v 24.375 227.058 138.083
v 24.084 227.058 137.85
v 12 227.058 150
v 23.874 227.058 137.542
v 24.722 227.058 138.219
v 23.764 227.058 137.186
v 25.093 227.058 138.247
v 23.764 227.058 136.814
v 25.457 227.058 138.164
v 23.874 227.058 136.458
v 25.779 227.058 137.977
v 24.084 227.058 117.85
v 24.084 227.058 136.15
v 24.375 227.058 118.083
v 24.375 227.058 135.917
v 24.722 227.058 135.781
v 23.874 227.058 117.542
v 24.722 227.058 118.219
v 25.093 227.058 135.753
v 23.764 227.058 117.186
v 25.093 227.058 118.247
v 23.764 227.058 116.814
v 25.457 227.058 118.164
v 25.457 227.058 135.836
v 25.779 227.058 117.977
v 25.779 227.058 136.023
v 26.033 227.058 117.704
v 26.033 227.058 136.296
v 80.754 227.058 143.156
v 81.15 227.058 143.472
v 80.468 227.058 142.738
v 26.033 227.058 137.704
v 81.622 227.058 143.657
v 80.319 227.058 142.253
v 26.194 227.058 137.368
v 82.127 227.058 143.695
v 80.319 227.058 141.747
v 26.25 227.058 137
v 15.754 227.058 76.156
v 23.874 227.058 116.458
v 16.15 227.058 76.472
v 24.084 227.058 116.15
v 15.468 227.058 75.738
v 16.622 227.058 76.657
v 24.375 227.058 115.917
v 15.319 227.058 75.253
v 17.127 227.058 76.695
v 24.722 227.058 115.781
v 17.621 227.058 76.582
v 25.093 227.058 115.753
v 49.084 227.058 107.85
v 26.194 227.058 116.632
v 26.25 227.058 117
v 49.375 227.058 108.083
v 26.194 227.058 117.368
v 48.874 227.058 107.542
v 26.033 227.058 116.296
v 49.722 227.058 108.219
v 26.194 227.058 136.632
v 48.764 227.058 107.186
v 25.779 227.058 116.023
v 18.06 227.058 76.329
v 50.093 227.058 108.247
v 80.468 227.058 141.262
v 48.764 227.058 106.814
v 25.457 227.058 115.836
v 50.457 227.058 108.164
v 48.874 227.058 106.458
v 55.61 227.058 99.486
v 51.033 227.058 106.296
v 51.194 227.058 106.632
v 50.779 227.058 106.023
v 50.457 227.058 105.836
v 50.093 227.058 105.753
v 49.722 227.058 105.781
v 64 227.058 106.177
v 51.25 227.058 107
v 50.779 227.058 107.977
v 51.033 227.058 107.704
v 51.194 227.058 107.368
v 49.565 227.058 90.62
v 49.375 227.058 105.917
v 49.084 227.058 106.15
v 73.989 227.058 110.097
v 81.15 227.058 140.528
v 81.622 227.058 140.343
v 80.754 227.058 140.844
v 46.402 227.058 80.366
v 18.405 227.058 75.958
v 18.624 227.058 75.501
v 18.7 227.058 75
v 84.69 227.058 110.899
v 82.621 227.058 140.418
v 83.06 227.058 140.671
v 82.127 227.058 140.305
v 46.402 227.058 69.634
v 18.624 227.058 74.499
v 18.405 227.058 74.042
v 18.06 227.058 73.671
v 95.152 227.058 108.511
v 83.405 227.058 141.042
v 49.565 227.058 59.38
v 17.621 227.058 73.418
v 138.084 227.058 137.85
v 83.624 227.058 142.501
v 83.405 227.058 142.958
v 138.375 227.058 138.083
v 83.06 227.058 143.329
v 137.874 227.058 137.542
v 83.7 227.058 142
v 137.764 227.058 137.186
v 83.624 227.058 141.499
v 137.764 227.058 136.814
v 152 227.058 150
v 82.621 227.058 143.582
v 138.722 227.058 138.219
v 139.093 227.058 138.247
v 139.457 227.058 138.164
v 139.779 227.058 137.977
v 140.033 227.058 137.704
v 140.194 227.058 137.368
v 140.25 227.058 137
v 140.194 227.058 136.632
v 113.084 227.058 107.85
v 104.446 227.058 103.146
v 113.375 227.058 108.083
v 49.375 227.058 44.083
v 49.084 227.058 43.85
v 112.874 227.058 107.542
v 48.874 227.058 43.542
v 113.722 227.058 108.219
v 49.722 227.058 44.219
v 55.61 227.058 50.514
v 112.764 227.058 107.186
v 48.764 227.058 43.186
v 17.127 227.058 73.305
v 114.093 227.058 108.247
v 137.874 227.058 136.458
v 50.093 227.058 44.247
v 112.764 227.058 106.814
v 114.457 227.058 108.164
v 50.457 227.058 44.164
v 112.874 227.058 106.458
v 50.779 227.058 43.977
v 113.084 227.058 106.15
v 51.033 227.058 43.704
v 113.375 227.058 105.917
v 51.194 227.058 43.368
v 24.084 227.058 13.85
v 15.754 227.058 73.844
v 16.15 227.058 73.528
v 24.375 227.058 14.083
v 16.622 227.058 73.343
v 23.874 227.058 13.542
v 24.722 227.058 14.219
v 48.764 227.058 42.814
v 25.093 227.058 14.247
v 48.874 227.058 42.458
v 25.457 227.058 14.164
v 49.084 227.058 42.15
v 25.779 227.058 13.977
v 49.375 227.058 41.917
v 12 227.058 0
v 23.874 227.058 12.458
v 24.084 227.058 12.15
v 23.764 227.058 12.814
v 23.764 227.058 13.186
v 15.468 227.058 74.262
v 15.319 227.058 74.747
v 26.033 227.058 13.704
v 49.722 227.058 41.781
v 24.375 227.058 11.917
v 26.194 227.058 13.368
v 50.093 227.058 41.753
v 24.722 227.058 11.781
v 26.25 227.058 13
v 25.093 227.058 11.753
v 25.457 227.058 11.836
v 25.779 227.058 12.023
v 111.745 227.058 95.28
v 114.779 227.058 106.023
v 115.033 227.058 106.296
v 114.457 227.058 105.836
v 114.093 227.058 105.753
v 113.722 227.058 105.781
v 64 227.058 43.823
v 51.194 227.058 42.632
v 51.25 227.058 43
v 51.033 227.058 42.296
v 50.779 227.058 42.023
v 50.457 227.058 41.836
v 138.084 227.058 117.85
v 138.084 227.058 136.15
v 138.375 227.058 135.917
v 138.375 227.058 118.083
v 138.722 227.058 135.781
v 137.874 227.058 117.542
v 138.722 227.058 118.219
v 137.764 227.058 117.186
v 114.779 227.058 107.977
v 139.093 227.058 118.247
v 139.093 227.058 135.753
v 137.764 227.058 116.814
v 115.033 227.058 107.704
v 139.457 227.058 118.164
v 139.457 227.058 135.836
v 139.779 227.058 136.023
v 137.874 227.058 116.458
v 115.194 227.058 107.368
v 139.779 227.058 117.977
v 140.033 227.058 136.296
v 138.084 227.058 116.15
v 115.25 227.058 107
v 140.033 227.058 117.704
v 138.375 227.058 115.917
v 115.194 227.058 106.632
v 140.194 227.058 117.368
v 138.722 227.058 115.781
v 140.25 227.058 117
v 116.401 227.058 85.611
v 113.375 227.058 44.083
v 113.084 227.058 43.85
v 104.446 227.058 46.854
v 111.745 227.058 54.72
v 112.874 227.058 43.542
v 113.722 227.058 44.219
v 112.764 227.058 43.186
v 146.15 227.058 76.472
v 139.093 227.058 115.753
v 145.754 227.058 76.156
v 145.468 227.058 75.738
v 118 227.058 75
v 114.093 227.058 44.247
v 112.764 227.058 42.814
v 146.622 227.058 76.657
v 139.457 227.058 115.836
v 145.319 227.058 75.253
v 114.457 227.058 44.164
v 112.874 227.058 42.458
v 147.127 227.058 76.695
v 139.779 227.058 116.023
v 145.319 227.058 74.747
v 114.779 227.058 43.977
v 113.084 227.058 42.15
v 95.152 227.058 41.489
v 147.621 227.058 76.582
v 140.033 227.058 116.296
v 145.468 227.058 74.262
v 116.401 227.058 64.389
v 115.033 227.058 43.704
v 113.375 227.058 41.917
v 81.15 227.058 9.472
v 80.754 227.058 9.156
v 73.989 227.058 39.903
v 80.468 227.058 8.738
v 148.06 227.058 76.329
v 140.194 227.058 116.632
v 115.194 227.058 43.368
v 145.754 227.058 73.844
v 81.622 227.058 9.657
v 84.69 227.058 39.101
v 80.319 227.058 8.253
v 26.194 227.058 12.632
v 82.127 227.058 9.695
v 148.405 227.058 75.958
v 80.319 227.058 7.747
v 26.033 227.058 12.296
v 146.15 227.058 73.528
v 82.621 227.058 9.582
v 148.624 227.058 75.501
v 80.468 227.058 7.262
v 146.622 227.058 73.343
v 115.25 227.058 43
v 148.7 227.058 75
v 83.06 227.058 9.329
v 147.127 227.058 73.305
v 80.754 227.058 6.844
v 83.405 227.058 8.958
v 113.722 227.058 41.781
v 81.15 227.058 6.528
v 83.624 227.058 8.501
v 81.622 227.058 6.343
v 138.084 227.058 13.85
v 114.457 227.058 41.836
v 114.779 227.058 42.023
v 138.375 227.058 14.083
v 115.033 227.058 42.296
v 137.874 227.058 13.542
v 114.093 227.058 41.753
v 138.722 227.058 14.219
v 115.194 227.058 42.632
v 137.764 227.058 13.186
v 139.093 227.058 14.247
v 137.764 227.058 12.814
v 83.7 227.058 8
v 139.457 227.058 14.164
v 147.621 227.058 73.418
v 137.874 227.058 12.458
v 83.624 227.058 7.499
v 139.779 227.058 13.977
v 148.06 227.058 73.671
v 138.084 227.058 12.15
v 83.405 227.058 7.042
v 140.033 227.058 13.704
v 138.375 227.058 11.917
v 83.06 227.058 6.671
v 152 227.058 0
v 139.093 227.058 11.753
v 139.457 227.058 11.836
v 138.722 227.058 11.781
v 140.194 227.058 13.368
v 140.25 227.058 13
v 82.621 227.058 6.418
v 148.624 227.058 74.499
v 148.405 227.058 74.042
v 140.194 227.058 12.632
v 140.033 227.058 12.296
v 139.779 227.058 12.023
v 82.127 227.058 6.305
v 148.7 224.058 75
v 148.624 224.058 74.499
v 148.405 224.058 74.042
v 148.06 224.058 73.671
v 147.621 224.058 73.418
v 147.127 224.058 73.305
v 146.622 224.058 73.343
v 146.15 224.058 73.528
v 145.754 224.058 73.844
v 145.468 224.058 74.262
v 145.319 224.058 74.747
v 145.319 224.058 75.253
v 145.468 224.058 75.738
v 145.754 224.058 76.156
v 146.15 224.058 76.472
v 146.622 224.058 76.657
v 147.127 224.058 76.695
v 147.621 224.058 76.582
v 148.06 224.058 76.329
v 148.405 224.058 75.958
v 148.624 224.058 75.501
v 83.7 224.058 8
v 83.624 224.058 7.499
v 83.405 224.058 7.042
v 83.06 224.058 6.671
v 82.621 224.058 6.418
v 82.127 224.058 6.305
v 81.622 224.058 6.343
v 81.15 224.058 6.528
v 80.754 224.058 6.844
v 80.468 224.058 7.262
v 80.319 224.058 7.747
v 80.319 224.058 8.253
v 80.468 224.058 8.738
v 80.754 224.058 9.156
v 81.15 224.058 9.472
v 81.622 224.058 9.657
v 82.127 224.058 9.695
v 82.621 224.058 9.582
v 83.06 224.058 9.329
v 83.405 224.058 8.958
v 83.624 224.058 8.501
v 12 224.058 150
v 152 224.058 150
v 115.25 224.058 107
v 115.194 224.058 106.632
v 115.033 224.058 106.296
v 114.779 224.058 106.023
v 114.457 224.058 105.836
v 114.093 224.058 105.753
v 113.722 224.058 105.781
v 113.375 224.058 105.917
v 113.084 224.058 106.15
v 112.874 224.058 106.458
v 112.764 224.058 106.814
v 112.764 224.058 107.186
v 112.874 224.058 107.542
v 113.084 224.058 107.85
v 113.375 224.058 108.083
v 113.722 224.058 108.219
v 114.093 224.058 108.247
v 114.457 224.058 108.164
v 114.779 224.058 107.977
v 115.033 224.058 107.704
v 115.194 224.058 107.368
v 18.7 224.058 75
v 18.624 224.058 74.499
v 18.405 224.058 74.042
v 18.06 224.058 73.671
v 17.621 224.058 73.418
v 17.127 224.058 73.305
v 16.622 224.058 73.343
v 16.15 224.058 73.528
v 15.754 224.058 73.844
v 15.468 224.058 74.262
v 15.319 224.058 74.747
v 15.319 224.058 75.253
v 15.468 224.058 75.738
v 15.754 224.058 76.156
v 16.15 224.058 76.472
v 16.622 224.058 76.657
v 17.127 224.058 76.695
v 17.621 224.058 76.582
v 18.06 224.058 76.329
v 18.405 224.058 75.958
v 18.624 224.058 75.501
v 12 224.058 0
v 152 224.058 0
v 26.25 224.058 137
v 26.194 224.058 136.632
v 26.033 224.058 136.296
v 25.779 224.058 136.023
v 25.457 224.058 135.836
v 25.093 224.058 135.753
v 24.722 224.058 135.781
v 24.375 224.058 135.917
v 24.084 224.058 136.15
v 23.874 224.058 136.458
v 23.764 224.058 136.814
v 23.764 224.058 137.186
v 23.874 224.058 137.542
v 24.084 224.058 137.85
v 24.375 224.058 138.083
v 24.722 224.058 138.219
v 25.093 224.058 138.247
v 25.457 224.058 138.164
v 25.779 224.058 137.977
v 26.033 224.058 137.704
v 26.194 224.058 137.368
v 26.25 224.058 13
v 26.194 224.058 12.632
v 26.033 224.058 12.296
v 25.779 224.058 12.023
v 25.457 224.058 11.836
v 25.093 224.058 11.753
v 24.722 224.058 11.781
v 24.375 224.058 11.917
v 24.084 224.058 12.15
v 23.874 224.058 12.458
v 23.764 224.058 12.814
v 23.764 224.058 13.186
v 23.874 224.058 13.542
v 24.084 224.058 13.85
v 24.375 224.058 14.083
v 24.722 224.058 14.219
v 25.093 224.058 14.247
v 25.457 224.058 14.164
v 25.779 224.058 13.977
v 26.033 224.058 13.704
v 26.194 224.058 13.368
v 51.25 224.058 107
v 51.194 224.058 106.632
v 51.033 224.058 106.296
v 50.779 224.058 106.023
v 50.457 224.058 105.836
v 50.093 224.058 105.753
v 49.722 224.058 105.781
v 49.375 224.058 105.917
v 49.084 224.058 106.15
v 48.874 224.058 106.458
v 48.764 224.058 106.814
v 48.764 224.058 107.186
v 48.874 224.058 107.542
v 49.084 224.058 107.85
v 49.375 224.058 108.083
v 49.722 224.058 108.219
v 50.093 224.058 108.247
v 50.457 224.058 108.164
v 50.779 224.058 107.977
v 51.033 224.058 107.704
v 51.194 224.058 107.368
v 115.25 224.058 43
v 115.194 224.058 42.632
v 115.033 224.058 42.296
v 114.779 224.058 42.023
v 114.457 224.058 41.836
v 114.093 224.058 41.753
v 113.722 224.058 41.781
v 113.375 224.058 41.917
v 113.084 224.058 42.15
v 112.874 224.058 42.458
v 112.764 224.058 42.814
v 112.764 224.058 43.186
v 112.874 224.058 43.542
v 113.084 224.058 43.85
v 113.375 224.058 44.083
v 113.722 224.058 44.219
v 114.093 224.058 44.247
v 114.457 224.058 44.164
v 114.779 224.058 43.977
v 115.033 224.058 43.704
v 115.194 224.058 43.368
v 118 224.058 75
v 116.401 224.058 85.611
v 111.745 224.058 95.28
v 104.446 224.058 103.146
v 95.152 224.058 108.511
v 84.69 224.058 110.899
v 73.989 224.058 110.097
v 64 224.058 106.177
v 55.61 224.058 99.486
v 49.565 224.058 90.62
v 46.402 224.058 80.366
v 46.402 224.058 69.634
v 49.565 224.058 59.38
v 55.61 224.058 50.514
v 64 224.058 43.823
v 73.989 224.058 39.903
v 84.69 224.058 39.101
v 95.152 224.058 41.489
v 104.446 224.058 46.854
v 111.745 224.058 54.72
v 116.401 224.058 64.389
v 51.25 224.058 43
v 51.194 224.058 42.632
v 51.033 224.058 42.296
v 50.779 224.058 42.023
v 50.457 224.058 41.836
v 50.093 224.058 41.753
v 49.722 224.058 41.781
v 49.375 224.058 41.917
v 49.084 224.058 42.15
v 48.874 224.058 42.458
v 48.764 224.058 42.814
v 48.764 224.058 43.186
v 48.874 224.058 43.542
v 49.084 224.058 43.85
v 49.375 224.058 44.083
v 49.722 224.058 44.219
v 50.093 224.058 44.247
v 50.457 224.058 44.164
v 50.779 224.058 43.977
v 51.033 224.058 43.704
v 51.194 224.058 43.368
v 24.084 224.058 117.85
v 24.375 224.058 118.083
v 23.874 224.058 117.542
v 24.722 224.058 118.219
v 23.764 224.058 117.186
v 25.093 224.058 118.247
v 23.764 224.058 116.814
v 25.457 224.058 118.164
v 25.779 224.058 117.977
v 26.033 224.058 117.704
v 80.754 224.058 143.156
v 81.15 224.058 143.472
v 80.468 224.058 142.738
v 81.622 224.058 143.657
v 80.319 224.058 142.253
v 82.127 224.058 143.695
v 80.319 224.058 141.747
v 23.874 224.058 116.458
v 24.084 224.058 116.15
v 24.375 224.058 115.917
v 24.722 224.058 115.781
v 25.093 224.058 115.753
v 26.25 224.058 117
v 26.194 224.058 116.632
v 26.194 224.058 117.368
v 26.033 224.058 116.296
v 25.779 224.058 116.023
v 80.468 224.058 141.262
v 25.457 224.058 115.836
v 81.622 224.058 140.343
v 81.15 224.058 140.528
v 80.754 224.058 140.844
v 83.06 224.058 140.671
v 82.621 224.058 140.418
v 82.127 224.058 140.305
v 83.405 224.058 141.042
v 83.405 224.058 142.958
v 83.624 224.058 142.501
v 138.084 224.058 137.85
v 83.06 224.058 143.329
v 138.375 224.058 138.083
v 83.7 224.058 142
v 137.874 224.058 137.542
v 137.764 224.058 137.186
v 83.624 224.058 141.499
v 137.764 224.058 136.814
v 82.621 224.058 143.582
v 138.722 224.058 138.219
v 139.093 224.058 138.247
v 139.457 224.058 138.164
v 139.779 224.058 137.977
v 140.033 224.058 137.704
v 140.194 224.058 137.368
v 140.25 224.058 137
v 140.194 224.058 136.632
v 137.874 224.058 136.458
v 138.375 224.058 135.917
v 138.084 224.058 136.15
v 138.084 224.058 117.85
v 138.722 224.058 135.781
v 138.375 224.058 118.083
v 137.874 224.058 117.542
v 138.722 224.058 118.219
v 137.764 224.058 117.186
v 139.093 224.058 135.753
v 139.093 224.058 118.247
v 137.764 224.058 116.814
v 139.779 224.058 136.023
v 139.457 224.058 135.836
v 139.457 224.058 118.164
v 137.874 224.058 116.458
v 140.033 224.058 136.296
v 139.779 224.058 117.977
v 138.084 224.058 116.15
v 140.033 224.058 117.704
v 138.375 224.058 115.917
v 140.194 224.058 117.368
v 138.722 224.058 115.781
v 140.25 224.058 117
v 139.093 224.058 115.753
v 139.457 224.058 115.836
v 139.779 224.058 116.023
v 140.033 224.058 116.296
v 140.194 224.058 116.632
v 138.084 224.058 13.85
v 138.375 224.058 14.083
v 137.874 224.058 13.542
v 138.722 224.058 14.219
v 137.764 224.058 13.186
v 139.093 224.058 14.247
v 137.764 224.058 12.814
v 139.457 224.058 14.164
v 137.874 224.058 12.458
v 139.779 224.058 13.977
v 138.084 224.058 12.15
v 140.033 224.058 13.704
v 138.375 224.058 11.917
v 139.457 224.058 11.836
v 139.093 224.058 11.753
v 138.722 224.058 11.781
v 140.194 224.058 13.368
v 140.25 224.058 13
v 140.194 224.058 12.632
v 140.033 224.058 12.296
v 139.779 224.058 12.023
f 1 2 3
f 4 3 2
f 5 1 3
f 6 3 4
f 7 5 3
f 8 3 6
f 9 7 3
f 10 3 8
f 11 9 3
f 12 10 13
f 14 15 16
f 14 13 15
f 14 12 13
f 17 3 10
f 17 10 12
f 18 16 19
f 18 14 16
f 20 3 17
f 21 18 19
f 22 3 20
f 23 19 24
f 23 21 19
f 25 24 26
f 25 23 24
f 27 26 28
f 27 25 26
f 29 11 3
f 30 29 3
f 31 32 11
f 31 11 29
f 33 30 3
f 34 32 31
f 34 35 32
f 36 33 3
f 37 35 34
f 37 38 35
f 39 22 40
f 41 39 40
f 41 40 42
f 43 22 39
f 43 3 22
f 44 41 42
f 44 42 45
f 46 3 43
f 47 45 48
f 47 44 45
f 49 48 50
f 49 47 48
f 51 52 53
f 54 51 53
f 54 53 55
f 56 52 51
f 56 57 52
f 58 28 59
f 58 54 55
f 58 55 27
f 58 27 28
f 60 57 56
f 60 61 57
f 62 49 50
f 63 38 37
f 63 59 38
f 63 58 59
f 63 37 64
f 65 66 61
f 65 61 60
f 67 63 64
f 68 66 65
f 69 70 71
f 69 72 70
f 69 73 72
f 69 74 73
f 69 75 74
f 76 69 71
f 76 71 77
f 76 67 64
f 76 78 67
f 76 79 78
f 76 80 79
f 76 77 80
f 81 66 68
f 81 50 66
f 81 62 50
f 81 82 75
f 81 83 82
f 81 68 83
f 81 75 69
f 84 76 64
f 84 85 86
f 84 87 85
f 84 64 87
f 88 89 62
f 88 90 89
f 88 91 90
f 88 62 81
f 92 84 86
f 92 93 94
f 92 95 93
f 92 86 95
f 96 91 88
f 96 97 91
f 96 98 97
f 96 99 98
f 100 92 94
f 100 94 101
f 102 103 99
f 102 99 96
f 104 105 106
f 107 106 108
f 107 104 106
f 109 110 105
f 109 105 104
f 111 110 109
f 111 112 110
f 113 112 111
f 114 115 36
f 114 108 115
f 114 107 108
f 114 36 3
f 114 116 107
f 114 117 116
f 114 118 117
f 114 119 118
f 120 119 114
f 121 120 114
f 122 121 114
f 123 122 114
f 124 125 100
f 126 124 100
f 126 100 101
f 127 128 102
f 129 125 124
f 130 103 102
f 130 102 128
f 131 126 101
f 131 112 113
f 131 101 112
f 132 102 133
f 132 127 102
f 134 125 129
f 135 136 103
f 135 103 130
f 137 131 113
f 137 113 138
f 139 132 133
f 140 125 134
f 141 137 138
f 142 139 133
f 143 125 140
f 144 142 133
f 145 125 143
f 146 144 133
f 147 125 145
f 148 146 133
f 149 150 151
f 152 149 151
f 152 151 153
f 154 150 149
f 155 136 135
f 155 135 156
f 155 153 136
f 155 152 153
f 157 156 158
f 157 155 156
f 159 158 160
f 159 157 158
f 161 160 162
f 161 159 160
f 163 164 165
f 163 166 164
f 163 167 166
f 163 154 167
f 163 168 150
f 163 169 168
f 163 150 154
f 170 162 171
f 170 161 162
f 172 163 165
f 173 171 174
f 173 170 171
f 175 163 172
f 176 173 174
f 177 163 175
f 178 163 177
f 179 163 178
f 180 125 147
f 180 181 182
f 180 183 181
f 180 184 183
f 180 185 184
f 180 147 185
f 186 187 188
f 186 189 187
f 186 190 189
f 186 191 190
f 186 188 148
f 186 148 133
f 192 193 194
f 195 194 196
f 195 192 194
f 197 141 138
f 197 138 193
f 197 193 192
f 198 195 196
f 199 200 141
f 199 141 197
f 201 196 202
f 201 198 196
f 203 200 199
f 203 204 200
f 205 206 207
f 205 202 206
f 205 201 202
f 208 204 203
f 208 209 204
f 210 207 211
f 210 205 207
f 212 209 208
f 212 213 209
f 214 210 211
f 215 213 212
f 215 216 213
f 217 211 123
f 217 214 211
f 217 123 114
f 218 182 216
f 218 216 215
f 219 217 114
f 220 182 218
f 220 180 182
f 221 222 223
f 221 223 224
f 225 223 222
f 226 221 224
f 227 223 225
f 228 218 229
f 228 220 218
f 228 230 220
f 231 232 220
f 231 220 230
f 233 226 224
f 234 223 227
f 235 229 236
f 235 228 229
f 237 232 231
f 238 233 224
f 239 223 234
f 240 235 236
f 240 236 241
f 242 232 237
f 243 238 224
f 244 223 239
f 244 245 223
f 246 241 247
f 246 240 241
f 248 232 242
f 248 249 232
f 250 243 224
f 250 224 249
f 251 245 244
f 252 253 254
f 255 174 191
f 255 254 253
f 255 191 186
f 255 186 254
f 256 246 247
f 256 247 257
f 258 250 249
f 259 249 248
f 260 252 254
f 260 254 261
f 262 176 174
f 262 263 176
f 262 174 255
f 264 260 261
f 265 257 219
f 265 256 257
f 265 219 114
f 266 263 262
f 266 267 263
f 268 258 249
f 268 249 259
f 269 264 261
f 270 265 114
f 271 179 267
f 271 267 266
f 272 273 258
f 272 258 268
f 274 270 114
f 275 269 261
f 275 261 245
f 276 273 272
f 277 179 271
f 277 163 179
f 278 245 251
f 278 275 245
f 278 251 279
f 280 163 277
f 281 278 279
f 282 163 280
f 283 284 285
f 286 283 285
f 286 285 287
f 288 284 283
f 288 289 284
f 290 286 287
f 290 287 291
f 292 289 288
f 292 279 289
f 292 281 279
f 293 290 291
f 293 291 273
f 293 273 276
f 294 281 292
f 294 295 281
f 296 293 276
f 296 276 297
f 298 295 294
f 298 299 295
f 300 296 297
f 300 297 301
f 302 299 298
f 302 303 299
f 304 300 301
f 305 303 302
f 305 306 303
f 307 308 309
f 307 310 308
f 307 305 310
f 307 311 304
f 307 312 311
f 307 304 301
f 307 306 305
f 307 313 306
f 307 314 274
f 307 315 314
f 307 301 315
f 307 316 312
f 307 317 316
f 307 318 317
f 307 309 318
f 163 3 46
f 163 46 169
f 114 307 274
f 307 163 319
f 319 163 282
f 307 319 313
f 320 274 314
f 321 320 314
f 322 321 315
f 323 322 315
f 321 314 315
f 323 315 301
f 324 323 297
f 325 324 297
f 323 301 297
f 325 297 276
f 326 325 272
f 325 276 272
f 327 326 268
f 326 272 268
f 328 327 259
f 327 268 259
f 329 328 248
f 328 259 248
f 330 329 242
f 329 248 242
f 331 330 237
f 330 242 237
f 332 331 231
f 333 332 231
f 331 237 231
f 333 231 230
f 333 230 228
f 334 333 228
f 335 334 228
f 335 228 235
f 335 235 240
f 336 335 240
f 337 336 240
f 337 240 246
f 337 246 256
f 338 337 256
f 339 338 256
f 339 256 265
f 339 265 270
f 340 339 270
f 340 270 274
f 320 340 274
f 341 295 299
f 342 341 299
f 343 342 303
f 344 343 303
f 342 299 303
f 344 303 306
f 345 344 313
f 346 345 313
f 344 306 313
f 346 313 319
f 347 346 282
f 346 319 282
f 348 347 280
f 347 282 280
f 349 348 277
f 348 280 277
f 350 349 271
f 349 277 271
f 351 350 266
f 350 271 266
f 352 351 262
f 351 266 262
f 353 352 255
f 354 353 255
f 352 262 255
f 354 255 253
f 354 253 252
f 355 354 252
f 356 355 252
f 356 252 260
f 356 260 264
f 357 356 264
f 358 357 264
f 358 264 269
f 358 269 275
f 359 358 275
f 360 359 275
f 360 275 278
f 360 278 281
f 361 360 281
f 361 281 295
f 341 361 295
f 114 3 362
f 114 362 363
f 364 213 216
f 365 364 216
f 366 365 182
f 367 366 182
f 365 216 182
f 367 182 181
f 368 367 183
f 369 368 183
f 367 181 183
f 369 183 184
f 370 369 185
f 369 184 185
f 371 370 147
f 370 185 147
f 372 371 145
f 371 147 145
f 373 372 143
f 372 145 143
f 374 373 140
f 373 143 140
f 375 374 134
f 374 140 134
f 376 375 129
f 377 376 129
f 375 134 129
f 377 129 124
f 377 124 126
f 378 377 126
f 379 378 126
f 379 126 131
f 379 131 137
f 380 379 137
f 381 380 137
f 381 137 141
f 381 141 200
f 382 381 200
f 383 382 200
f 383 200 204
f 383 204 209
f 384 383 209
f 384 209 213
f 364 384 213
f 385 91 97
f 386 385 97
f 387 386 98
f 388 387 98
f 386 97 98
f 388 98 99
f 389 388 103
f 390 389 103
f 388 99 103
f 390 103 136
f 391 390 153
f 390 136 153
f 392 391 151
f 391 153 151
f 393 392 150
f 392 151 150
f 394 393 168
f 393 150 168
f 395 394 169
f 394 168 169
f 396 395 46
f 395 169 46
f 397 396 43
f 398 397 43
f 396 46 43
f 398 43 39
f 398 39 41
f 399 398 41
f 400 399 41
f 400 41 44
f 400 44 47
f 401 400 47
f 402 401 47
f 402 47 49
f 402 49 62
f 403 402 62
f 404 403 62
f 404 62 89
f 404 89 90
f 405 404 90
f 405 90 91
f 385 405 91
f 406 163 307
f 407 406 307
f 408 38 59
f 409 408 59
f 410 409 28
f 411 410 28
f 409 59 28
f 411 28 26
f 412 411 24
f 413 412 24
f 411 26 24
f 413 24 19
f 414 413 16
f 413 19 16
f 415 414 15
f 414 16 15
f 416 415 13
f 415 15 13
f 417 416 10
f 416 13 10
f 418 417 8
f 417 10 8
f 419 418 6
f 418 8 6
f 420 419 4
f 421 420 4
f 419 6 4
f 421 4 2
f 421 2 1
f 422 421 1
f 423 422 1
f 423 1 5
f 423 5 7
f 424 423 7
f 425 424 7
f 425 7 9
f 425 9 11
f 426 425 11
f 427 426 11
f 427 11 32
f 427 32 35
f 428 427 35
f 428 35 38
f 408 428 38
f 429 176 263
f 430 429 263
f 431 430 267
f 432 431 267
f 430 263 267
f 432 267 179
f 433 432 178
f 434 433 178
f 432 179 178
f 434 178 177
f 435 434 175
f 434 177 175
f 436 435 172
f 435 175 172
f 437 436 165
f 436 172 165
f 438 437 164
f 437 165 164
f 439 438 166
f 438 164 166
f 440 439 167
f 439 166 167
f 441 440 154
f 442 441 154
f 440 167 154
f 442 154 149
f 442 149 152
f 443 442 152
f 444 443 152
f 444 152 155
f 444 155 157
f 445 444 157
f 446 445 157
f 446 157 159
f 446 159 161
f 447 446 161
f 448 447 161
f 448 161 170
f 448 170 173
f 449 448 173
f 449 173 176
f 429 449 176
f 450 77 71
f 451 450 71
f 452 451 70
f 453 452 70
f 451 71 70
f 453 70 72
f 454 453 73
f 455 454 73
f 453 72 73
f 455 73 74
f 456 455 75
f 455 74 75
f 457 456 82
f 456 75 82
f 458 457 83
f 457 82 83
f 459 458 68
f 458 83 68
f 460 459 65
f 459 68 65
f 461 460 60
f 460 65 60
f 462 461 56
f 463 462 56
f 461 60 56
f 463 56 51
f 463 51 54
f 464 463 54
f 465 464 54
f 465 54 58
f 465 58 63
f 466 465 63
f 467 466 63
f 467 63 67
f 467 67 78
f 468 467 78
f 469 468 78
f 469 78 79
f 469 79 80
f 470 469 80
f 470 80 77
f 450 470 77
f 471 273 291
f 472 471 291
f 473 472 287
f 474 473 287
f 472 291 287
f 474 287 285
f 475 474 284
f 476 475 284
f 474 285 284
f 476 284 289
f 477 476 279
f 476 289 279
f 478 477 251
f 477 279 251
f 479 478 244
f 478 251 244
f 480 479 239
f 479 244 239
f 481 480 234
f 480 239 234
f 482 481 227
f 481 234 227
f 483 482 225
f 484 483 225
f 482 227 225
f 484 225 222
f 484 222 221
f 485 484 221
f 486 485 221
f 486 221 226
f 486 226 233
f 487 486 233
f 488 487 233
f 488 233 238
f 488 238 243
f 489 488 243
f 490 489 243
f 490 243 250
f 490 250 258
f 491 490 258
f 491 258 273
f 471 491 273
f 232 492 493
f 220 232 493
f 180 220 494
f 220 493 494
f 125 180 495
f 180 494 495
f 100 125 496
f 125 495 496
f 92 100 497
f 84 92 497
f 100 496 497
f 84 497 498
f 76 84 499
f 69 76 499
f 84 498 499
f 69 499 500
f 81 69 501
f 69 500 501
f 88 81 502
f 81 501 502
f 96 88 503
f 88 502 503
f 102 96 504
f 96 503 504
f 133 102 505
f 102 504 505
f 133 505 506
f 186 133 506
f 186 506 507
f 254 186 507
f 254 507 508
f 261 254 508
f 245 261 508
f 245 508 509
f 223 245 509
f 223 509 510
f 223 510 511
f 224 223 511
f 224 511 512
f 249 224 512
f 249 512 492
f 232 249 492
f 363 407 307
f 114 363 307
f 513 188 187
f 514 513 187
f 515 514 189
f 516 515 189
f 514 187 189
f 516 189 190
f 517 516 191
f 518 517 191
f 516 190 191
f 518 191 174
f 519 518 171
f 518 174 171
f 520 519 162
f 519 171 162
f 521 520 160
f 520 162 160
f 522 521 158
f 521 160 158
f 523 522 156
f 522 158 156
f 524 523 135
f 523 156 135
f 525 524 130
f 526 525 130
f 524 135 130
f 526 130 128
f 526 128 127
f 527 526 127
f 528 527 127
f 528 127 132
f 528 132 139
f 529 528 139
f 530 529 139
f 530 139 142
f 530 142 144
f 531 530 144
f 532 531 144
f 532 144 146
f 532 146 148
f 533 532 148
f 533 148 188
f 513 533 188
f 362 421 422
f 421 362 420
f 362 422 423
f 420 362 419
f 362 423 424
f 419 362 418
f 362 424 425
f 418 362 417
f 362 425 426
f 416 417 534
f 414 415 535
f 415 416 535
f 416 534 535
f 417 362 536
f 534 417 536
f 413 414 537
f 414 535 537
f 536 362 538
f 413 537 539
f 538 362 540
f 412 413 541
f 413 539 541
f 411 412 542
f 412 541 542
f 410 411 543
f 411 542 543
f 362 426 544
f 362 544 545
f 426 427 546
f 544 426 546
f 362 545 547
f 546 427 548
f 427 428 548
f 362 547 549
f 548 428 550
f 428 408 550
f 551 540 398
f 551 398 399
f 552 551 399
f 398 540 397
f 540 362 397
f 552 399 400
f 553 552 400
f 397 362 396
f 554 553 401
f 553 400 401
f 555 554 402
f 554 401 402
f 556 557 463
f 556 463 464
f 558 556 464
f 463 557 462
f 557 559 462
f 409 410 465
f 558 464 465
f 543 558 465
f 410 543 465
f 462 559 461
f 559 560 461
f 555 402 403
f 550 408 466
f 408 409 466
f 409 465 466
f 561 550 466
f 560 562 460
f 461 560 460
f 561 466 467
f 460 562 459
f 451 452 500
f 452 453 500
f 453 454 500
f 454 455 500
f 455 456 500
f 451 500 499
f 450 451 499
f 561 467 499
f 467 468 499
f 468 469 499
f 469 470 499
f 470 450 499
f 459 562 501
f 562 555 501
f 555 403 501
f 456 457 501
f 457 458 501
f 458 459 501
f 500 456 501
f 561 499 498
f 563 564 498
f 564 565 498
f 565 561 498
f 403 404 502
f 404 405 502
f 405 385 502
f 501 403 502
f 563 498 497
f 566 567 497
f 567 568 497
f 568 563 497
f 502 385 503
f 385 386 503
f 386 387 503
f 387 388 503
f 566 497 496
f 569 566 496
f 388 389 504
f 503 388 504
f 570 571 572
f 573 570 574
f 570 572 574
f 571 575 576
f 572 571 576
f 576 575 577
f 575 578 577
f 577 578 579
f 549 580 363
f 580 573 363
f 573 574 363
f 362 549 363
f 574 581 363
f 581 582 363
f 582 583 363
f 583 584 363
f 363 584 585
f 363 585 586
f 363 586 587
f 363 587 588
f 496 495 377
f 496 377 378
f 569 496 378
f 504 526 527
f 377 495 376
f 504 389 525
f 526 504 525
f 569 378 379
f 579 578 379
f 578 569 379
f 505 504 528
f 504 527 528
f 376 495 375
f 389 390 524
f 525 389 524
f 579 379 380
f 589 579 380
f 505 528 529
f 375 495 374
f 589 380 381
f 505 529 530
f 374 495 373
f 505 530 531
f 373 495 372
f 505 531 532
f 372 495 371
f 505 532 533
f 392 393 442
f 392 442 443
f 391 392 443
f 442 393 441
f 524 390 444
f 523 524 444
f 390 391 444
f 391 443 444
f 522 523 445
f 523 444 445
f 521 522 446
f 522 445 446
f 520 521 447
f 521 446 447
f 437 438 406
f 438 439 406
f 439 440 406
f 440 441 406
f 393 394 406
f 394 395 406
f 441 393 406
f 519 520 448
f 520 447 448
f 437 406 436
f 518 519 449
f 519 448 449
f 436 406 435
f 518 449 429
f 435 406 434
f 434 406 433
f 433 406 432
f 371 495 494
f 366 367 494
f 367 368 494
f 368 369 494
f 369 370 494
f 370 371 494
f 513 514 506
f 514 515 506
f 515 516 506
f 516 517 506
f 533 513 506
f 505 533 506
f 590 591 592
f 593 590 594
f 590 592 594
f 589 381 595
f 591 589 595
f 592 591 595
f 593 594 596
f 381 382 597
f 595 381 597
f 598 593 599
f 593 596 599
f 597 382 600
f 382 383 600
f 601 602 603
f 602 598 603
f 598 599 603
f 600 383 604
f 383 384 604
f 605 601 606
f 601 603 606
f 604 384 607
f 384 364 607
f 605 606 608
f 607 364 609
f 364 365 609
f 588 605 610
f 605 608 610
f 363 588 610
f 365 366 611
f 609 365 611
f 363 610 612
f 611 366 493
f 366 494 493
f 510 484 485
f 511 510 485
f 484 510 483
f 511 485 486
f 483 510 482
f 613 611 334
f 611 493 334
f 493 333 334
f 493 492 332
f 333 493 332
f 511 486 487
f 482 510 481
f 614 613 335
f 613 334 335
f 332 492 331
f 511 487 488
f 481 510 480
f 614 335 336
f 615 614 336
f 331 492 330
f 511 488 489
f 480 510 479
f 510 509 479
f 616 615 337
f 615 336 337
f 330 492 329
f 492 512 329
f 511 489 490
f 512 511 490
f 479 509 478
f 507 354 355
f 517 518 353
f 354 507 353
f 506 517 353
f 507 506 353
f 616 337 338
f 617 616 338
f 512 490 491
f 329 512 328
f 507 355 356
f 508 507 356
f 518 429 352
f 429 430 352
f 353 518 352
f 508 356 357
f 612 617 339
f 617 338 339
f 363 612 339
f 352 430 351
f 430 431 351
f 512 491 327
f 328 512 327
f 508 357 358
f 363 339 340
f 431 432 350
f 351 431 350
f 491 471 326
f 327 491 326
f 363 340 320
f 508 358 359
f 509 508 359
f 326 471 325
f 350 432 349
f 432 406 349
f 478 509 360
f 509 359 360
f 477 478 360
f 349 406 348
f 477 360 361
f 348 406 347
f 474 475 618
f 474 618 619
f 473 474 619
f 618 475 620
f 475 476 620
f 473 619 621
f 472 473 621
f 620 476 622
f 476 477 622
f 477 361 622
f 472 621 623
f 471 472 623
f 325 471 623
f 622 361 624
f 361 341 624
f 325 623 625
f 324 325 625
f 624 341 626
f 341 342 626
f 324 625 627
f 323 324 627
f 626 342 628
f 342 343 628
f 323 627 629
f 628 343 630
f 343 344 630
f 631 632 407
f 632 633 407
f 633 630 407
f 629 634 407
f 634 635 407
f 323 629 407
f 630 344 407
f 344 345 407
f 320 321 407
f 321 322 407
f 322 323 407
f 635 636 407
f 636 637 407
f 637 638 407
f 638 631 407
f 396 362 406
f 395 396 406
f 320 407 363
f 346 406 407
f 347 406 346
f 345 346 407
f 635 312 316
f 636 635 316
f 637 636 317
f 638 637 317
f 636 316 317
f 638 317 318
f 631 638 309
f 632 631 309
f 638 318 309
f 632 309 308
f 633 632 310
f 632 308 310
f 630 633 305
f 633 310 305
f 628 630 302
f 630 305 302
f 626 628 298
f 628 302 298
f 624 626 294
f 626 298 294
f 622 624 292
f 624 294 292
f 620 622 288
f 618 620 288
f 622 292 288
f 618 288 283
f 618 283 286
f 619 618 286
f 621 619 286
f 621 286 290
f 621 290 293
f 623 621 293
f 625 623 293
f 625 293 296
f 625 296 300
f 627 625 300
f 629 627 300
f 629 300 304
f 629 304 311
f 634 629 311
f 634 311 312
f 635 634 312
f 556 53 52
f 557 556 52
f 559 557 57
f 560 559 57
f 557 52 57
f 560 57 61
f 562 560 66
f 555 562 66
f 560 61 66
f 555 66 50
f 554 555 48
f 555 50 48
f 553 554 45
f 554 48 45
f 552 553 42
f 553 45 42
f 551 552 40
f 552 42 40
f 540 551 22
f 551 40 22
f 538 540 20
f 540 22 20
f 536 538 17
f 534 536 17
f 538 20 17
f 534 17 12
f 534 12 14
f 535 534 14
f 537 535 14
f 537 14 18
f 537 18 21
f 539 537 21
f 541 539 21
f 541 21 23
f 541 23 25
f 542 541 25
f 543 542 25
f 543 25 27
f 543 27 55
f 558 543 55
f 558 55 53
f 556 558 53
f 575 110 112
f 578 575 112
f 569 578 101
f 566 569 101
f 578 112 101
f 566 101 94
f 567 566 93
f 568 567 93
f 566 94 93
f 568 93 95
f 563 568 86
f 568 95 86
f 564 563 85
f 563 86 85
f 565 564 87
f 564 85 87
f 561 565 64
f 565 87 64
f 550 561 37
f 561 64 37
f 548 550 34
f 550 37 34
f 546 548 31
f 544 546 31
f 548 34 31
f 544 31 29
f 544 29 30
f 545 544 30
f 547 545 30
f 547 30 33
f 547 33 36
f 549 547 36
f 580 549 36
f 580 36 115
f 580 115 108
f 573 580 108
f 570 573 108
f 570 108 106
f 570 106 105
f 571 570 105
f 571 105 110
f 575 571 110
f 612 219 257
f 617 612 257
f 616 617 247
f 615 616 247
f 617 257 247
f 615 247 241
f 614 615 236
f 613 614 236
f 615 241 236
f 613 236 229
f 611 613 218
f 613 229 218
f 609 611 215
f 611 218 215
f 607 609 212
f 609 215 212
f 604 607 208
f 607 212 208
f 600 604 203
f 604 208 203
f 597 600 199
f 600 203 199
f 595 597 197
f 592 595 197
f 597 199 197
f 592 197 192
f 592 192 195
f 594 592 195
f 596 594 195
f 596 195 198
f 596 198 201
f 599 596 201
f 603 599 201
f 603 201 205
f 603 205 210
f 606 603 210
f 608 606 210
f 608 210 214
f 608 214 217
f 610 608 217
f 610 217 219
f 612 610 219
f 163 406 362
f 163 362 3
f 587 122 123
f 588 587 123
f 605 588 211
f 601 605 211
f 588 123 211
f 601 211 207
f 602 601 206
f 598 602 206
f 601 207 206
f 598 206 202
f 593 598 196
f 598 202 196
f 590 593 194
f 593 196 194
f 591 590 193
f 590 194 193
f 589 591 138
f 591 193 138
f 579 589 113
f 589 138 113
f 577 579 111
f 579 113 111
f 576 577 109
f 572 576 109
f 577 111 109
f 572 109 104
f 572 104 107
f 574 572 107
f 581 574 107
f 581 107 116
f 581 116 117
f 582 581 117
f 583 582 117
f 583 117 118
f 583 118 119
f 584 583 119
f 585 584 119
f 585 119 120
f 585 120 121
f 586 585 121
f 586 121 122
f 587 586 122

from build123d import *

# Parameters (mm, degrees)
SKETCH_1_W           = 140
SKETCH_1_H           = 3
EXTRUDE_1_DEPTH      = 150
CUT_EXTRUDE_1_REACH  = 5
SKETCH_2_R           = 36
HOLE_WIZARD_M3_1_D   = 2.5
HOLE_WIZARD_M3_1_2_D = 3.4
HOLE_WIZARD_M3_2_D   = 2.5


with BuildPart() as part:
    # 草图1 → 拉伸-薄壁1 (new body)
    with BuildSketch(Plane.XY):
        with Locations((82, 225.557982809)):
            Rectangle(SKETCH_1_W, SKETCH_1_H)
    extrude(amount=EXTRUDE_1_DEPTH)

    # 草图2 → 切除-拉伸1 (cut, up to next)
    with BuildSketch(Plane.XZ.offset(-224.057982809), mode=Mode.PRIVATE) as cut_extrude_1_sk1:
        with Locations((82, 75)):
            Circle(SKETCH_2_R)
    cut_extrude_1_tool1 = extrude(cut_extrude_1_sk1.sketch, amount=-CUT_EXTRUDE_1_REACH, mode=Mode.PRIVATE) & part.part
    add(cut_extrude_1_tool1.solids().sort_by_distance((82, 224.057983, 75))[0], mode=Mode.SUBTRACT)

    # Hole Wizard M3 _1 (through all)
    with Locations(Plane(origin=(0, 224.057982809, 0), x_dir=(-1, 0, 0), z_dir=(0, -1, 0))):
        with Locations((-50, -107), (-50, -43), (-114, -43), (-114, -107)):
            Hole(HOLE_WIZARD_M3_1_D / 2)

    # Hole Wizard M3 _1 2 (through all)
    with Locations(Plane(origin=(0, 224.057982809, 0), x_dir=(-1, 0, 0), z_dir=(0, -1, 0))):
        with Locations((-82, -142), (-147, -75), (-82, -8), (-17, -75)):
            Hole(HOLE_WIZARD_M3_1_2_D / 2)

    # M3 螺纹孔的螺纹孔钻头2 (through all)
    with Locations(Plane(origin=(0, 224.057982809, 0), x_dir=(-1, 0, 0), z_dir=(0, -1, 0))):
        with Locations((-139, -137), (-139, -117), (-139, -13), (-25, -137), (-25, -117), (-25, -13)):
            Hole(HOLE_WIZARD_M3_2_D / 2)


solid = part.part
